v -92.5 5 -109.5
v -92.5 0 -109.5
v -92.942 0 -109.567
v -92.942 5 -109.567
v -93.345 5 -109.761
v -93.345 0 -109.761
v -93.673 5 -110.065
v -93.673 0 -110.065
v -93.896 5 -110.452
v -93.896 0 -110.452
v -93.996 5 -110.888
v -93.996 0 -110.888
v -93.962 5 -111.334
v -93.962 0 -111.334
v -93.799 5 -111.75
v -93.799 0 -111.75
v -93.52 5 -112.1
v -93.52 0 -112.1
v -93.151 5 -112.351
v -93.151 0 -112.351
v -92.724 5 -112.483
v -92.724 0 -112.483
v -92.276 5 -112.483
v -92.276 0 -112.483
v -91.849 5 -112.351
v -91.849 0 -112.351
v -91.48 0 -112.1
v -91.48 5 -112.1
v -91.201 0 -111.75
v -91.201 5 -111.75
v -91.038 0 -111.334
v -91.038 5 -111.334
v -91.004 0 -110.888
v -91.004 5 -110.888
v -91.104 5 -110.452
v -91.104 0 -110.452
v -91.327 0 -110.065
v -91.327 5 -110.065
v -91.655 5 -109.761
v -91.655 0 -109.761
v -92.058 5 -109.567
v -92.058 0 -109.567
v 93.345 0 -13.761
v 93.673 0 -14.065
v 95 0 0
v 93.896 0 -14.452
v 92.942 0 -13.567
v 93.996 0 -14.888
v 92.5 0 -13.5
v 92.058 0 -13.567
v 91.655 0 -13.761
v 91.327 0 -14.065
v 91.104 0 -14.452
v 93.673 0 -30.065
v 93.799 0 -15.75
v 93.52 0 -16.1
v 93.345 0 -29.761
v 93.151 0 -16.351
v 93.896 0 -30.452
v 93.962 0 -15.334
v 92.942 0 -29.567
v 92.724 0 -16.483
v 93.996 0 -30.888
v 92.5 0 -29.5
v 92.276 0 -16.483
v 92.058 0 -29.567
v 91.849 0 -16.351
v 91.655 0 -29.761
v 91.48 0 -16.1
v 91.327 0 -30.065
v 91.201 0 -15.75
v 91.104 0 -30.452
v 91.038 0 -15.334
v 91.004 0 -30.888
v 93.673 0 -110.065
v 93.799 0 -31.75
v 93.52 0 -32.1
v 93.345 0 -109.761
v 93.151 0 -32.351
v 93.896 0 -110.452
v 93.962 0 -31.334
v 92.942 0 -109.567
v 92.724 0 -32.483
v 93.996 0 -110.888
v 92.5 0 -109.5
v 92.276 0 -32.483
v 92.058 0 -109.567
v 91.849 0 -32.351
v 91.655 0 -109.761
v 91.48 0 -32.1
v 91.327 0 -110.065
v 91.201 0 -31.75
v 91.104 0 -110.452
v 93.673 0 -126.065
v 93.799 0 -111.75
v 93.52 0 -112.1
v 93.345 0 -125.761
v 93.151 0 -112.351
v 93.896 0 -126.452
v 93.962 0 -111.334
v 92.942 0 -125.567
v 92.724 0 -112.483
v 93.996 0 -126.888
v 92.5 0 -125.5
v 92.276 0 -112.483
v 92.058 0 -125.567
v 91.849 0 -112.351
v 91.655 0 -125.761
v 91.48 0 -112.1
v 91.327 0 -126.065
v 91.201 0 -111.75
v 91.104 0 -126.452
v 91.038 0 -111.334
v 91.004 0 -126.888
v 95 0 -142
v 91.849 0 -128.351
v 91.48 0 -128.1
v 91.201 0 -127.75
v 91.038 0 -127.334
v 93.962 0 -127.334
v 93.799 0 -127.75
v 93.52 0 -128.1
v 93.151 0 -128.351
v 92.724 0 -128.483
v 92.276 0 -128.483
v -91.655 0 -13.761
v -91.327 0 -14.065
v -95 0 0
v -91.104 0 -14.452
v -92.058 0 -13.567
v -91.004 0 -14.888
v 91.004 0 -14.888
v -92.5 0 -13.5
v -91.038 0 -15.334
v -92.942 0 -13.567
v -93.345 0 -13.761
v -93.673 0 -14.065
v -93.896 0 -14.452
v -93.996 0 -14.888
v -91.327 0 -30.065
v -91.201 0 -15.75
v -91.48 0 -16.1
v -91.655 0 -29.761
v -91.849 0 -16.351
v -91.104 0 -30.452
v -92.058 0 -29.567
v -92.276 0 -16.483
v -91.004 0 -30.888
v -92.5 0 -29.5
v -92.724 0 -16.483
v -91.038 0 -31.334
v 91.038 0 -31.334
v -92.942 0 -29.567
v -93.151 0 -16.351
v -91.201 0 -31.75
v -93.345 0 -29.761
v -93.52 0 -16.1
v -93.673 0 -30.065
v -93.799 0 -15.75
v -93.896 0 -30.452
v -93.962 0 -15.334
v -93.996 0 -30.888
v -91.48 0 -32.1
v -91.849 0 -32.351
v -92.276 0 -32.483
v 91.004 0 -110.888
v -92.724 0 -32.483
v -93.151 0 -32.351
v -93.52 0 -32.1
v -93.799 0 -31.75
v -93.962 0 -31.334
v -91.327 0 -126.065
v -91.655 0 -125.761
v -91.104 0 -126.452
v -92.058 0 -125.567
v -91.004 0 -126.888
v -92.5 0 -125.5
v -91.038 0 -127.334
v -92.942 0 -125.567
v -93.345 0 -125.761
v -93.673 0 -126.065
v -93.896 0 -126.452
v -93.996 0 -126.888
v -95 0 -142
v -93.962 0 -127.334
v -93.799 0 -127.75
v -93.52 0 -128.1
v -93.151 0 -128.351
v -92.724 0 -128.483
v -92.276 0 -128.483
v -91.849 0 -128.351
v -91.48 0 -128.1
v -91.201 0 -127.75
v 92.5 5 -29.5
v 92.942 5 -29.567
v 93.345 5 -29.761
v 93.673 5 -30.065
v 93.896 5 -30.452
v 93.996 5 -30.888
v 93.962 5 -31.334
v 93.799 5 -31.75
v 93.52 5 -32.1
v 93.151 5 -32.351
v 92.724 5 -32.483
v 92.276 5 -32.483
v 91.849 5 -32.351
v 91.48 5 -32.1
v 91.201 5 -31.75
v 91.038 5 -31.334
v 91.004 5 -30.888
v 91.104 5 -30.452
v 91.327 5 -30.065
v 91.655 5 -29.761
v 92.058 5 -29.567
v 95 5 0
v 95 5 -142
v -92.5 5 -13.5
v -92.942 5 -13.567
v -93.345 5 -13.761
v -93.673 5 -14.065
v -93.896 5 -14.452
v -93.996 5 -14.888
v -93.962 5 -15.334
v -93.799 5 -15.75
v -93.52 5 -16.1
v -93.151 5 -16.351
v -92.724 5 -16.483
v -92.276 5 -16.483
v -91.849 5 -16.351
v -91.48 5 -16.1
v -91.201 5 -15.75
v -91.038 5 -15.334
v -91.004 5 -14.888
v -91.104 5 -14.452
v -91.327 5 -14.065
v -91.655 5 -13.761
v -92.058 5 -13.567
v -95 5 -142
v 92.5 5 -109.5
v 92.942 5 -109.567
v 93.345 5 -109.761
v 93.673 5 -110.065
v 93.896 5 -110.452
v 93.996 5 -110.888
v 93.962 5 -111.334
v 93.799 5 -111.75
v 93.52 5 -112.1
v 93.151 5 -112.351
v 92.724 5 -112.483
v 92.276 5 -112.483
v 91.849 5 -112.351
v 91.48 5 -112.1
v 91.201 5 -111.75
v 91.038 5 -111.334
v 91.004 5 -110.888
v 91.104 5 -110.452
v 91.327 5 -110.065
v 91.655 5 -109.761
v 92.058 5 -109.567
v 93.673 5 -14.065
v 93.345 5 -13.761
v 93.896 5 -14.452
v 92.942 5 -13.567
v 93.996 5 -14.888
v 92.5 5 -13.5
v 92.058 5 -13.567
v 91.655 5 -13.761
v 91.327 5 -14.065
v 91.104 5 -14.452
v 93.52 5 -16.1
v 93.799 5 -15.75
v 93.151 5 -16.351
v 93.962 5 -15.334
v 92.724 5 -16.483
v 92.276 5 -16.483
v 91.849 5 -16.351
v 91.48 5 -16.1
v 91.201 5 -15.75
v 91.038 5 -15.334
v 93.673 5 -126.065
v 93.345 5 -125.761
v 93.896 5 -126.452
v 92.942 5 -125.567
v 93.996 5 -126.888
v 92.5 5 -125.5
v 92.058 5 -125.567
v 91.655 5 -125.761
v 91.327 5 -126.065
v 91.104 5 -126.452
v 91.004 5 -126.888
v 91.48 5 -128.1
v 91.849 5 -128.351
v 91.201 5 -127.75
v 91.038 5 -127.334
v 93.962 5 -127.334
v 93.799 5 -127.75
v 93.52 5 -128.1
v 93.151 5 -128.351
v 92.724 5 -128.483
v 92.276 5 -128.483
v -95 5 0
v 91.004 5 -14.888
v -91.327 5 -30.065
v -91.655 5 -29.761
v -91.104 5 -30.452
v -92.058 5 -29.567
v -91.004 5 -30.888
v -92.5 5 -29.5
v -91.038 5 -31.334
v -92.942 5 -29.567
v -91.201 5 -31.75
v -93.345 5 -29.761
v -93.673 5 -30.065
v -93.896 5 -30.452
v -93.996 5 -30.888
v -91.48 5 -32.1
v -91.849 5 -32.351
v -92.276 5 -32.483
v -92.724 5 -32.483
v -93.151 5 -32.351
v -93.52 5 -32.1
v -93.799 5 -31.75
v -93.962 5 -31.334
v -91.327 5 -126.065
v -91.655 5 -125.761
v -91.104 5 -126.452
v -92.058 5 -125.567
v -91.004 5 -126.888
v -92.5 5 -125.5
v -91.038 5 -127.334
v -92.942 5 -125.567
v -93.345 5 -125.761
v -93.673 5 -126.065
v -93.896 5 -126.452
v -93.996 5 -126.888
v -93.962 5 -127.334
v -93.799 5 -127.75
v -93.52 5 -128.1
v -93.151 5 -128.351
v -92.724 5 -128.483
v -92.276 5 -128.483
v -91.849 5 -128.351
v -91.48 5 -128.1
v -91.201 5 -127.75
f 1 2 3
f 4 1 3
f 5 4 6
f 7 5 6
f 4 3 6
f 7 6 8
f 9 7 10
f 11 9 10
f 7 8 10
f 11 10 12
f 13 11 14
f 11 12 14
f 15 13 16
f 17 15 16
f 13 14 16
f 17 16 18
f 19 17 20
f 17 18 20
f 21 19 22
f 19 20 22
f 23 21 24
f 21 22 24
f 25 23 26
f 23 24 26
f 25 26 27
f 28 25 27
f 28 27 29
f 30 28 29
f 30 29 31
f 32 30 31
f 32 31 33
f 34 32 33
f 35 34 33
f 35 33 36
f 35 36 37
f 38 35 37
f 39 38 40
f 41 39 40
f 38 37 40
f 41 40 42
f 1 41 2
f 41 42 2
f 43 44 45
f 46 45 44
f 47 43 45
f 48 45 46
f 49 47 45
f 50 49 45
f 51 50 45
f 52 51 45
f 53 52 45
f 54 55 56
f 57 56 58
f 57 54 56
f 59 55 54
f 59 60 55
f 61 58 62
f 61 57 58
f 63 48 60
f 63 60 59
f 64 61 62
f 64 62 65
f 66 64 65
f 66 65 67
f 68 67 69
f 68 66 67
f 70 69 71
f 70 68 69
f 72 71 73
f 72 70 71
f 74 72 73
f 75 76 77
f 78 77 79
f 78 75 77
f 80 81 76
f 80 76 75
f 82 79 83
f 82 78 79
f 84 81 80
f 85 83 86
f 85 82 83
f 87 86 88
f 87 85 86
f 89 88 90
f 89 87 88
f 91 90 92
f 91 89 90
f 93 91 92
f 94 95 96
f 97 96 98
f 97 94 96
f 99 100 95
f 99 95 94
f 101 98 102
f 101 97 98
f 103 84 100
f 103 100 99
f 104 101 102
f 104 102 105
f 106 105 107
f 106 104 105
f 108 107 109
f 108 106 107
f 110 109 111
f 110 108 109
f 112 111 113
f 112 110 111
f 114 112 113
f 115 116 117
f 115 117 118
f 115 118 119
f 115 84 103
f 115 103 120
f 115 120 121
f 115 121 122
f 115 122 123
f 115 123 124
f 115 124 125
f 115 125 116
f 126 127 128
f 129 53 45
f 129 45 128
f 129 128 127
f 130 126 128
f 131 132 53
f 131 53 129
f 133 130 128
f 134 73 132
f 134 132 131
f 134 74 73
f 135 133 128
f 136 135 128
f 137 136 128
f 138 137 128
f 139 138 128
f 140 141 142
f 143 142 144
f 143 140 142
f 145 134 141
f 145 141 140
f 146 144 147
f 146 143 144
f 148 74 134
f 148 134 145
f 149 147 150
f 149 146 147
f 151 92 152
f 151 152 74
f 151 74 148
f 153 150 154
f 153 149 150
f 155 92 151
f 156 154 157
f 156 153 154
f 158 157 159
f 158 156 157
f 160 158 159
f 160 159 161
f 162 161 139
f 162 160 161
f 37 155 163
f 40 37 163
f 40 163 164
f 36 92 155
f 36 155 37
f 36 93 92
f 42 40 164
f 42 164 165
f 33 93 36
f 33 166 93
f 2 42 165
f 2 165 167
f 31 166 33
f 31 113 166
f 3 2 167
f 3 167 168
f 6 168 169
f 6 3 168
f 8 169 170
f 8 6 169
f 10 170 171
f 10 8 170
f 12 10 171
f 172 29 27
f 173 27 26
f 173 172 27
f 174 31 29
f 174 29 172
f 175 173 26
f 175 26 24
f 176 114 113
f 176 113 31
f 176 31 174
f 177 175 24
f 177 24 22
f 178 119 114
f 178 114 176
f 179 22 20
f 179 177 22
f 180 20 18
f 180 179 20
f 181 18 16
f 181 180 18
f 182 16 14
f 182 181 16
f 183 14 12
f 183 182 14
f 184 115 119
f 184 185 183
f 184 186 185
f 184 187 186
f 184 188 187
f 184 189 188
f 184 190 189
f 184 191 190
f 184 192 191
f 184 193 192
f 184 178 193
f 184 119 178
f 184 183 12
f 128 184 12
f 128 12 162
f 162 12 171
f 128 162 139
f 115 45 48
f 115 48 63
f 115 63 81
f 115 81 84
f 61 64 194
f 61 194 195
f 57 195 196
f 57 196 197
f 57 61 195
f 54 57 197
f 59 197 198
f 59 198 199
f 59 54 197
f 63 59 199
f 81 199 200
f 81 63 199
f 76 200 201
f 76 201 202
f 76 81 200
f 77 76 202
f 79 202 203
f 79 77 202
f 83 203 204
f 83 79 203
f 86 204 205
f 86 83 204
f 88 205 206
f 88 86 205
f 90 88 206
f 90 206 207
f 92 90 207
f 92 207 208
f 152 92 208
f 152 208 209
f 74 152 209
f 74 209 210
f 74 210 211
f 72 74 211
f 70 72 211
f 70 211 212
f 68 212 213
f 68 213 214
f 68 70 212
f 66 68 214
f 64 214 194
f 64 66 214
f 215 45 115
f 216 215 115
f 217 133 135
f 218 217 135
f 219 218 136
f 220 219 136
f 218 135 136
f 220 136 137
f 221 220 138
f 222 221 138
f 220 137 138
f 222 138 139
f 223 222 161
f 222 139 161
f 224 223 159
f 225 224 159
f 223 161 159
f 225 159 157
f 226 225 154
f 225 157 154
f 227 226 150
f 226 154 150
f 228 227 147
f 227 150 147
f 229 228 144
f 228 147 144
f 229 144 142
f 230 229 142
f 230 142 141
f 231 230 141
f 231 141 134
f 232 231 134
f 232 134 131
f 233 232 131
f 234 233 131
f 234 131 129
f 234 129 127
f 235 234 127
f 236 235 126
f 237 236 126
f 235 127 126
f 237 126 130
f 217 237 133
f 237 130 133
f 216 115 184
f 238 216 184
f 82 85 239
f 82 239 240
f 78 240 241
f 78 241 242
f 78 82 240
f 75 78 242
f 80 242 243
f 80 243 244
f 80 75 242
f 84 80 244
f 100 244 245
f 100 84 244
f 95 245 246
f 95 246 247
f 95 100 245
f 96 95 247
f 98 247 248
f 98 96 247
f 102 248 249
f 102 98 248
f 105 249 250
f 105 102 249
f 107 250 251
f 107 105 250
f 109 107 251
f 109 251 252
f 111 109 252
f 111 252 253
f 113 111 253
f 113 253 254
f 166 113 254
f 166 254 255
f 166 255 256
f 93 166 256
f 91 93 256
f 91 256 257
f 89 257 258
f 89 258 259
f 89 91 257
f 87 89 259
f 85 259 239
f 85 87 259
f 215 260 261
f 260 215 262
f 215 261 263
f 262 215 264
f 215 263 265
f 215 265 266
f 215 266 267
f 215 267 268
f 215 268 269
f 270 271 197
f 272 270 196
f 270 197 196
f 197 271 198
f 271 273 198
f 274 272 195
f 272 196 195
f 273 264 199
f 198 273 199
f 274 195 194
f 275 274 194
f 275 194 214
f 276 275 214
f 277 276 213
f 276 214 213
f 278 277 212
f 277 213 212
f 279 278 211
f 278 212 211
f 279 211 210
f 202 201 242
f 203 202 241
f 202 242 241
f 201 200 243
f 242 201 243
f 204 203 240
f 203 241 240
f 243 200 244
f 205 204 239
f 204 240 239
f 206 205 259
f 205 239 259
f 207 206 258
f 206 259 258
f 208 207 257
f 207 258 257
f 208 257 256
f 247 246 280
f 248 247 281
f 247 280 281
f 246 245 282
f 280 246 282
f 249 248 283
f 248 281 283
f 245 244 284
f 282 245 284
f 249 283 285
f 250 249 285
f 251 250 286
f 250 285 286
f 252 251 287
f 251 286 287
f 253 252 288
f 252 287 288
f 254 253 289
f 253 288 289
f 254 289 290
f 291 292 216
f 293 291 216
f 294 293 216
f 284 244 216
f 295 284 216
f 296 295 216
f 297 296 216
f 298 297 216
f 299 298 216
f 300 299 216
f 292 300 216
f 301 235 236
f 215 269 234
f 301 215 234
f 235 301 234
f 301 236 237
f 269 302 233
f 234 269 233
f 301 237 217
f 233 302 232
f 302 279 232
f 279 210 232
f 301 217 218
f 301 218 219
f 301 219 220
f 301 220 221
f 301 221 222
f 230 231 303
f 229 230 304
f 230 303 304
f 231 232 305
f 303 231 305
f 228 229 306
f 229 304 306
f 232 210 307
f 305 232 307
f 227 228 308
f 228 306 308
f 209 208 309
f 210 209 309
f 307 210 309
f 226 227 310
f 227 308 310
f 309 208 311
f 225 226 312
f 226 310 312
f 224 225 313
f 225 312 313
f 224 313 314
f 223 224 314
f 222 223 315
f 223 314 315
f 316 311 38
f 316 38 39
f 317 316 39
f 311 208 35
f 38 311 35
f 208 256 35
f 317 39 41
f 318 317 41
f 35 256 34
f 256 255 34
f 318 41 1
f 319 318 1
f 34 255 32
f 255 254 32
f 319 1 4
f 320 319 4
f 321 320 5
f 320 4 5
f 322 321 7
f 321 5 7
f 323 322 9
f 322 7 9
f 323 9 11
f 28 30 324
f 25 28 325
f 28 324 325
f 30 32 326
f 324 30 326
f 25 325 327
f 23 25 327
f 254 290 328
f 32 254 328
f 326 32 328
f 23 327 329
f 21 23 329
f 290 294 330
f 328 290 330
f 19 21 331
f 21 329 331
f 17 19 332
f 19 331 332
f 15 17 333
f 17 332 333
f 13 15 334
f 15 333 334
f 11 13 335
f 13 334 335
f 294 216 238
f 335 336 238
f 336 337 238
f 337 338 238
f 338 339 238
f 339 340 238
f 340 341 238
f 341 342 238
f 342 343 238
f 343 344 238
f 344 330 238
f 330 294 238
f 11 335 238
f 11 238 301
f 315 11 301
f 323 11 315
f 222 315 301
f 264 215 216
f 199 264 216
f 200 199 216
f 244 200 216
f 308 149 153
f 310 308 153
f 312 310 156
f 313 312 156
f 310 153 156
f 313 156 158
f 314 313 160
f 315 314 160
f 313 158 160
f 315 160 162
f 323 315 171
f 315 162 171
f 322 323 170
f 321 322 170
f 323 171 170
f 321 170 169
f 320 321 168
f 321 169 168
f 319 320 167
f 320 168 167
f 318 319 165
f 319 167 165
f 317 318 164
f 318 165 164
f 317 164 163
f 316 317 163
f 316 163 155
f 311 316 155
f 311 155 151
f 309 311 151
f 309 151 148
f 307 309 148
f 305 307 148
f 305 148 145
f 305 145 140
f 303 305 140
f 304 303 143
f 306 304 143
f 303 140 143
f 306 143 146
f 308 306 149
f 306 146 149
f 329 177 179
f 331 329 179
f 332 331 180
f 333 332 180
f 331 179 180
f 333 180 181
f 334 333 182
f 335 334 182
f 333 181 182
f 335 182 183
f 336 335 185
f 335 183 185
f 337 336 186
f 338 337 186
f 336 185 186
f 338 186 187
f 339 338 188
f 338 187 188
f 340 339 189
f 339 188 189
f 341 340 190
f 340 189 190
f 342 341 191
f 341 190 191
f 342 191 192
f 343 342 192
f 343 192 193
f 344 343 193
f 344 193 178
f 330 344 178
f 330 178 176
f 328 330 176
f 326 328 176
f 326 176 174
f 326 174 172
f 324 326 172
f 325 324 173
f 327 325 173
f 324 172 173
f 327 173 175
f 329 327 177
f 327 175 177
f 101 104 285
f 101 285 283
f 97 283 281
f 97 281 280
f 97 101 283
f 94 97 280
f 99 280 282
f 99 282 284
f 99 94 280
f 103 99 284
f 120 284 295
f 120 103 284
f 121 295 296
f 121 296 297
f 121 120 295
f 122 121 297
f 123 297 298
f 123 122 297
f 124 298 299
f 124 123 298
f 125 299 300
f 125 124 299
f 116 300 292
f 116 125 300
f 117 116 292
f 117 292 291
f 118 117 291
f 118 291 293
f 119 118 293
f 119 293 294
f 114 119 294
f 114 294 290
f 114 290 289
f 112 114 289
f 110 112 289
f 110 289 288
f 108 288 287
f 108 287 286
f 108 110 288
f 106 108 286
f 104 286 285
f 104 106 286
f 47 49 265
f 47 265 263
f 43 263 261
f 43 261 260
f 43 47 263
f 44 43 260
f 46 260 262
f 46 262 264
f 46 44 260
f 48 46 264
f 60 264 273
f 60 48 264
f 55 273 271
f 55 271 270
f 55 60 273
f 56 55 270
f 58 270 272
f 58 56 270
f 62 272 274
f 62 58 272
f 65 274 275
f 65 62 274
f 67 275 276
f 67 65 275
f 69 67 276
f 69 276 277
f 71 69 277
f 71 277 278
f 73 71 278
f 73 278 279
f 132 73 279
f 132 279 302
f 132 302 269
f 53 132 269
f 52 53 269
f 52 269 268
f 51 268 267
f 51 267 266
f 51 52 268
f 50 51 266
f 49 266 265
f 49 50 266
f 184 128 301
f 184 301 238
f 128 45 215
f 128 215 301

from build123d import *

# Parameters (mm, degrees)
SKETCH1_W           = 95
SKETCH1_H           = 142
SKETCH1_R           = 1.5
BOSS_EXTRUDE1_DEPTH = 5


with BuildPart() as part:
    # Sketch1 → Boss-Extrude1 (new body)
    with BuildSketch(Plane(origin=(0, 0, 0), x_dir=(1, 0, 0), z_dir=(0, 1, 0))):
        with Locations((47.5, 71)):
            Rectangle(SKETCH1_W, SKETCH1_H)
        with Locations(Location((92.5, 15, 0), (0, 0, 270))):
            Circle(SKETCH1_R, mode=Mode.SUBTRACT)
        with Locations(Location((92.5, 31, 0), (0, 0, 270))):
            Circle(SKETCH1_R, mode=Mode.SUBTRACT)
        with Locations(Location((92.5, 127, 0), (0, 0, 270))):
            Circle(SKETCH1_R, mode=Mode.SUBTRACT)
        with Locations(Location((92.5, 111, 0), (0, 0, 270))):
            Circle(SKETCH1_R, mode=Mode.SUBTRACT)
    boss_extrude1 = extrude(amount=BOSS_EXTRUDE1_DEPTH)

    # Mirror1: Boss-Extrude1 across plane
    add(boss_extrude1.mirror(Plane(origin=(0, 5, 0), x_dir=(0, 0, 1), z_dir=(1, 0, 0))))


solid = part.part
